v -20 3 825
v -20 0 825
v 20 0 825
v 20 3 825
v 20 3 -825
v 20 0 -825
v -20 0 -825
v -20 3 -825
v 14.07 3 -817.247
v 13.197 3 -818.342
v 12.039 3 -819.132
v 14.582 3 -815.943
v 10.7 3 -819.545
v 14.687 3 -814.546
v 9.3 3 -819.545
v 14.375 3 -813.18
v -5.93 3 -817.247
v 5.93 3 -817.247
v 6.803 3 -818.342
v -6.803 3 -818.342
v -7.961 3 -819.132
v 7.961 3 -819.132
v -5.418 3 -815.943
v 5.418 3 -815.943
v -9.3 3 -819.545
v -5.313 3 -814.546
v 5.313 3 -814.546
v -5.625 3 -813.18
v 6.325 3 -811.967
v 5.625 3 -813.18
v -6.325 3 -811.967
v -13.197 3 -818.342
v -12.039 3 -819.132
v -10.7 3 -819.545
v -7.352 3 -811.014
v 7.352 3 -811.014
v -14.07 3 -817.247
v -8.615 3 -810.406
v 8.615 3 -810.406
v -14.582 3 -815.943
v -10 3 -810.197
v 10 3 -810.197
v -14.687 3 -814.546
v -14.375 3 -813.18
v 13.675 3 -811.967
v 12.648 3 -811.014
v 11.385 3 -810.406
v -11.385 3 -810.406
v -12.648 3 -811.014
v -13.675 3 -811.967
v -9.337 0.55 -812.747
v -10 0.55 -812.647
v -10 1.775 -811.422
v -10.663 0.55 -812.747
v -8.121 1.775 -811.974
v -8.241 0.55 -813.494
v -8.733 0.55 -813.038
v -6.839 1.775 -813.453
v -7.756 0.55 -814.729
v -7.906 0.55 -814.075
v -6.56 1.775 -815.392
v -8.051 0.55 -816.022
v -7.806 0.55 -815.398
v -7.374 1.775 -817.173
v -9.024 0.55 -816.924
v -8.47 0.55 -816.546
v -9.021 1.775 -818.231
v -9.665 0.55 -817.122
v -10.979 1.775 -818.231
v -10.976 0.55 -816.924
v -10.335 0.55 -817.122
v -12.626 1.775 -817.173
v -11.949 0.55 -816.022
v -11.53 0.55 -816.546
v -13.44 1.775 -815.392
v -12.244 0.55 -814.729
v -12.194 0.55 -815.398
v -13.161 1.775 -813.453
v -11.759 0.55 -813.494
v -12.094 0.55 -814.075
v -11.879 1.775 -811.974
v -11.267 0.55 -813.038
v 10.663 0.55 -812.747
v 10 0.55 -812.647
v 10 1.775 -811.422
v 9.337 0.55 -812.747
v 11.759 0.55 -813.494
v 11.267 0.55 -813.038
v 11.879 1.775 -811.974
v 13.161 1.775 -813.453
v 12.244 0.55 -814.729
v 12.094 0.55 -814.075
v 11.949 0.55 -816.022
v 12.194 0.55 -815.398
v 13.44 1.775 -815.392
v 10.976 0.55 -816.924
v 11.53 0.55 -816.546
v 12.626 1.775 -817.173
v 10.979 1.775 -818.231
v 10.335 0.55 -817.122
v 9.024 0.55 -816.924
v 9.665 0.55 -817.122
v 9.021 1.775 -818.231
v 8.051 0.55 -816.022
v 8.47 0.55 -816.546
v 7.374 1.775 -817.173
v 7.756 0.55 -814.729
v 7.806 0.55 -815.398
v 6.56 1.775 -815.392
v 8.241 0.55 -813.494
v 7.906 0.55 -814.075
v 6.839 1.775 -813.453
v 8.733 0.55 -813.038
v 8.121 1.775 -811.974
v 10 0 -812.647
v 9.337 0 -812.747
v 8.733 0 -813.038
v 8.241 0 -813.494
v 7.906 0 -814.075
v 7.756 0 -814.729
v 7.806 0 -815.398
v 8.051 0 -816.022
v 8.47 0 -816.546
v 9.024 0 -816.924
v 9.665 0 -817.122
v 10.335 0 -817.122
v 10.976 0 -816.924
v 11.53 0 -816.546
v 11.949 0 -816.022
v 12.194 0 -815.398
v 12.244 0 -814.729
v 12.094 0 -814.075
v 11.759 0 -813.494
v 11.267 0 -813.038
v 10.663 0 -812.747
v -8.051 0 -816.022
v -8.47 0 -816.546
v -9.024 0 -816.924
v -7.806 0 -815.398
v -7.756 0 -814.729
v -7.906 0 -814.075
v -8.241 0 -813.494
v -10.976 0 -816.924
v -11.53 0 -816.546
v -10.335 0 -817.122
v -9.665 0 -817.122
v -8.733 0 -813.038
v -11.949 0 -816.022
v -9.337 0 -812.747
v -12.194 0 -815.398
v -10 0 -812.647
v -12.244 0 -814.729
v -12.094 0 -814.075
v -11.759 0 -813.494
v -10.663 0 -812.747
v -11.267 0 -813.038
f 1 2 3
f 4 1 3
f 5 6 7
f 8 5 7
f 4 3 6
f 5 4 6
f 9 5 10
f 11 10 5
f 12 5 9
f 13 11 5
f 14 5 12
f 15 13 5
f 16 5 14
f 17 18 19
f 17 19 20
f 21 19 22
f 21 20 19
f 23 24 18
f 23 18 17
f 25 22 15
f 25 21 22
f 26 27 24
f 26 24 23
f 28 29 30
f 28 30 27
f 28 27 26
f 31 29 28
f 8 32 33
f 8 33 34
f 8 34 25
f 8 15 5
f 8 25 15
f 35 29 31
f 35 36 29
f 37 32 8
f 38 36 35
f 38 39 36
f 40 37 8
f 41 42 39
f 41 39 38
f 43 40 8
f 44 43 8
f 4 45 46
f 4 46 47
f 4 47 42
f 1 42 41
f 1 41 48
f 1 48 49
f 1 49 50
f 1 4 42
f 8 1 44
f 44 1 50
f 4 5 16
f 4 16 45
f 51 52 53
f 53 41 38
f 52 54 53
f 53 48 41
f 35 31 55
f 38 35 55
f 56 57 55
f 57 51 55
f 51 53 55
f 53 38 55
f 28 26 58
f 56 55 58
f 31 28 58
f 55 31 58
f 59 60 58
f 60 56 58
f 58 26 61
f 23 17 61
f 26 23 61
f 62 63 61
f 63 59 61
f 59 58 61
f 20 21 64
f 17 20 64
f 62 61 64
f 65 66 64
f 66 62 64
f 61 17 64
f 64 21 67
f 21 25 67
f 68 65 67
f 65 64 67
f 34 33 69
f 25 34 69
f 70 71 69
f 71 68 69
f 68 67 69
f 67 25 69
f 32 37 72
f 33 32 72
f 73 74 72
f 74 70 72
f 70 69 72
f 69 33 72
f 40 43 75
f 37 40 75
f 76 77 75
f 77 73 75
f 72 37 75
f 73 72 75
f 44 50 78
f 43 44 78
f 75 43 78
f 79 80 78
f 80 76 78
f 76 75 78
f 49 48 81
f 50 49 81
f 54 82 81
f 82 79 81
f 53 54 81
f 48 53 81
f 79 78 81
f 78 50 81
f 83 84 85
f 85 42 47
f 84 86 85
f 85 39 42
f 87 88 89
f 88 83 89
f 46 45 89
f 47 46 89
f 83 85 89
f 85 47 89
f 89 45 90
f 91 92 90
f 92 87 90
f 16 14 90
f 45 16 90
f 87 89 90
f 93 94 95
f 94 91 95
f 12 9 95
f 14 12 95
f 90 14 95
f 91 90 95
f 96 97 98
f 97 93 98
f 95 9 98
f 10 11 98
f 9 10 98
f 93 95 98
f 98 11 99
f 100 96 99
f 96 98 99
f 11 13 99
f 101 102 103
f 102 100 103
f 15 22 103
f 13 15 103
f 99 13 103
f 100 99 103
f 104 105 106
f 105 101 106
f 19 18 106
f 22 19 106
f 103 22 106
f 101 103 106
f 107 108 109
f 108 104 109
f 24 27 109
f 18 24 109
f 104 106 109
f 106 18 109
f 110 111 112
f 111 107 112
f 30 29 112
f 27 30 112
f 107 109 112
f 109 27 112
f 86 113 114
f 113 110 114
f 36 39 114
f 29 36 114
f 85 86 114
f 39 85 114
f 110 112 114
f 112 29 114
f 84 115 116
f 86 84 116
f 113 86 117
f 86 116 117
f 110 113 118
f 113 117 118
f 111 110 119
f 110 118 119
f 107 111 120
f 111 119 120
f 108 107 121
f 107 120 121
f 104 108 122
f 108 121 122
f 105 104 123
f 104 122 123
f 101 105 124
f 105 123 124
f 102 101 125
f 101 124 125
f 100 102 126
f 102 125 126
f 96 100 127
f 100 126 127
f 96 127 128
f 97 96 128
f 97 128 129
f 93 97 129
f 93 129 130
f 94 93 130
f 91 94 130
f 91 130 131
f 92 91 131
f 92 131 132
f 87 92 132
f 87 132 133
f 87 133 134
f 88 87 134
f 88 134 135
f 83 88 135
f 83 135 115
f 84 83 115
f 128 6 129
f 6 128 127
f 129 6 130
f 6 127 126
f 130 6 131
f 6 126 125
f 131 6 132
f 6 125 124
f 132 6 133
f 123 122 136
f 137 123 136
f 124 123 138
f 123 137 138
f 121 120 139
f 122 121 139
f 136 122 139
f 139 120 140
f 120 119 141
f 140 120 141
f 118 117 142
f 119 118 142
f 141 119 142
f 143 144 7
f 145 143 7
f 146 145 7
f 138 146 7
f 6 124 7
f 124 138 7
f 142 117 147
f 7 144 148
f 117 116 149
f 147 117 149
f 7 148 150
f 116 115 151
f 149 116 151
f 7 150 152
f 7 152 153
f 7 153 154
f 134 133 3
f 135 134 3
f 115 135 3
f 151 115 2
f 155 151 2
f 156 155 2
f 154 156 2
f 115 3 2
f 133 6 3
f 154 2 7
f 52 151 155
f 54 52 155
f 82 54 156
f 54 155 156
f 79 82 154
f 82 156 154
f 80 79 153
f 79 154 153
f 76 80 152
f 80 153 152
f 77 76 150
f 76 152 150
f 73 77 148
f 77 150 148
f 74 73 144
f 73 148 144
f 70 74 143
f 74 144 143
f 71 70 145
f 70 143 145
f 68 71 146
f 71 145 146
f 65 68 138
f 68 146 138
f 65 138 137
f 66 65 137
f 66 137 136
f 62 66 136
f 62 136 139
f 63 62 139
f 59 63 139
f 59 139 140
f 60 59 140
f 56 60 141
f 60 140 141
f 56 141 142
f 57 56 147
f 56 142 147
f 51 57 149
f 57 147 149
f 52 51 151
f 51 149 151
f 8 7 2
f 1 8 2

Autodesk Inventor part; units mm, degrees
ref_plane "YZ Plane" through (0, 0, 0) normal (1, 0, 0) x (0, 1, 0)
ref_plane "XZ Plane" through (0, 0, 0) normal (0, 1, 0) x (-1, 0, 0)
ref_plane "XY Plane" through (0, 0, 0) normal (0, 0, 1) x (1, 0, 0)
sketch "Sketch1" plane through (0, 0, 0) normal (0, 1, 0) x (-1, 0, 0)
  line L0 (20, 825) -> (-20, 825)
  line L1 (-20, 825) -> (-20, -825)
  line L2 (-20, -825) -> (20, -825)
  line L3 (20, -825) -> (20, 825)
  line L4 (20, 825) -> (-20, -825) construction
  line L5 (-20, 825) -> (20, -825) construction
  point P0 (0, 0)
  dimension "d0" = 40
  dimension "d1" = 1650
extrude "Extrusion1" add sketch "Sketch1" along normal blind 3
sketch "Sketch2" plane through (0, 3, 0) normal (0, 1, 0) x (1, 0, 0)
  line L0 (0, 824.897) -> (0, 814.897)
  line L1 (0, 814.897) -> (-10, 814.897)
  point P0 (0, 0)
  point P1 (10, 814.897)
  dimension "d4" = 10
  dimension "d5" = 10
hole "Hole1" at (-10, 3, -814.897) at (10, 3, -814.897) direction (0, -1, 0) diameter 4.5 depth 8 countersink diameter 9.4 countersink angle 90 clearance for "Countersunk Flat Head Screw ISO 2009/7046" size "M4" standard "ISO"
properties part number "SP53V1 Acrilico superior" material "Polycarbonate, Smoke"
